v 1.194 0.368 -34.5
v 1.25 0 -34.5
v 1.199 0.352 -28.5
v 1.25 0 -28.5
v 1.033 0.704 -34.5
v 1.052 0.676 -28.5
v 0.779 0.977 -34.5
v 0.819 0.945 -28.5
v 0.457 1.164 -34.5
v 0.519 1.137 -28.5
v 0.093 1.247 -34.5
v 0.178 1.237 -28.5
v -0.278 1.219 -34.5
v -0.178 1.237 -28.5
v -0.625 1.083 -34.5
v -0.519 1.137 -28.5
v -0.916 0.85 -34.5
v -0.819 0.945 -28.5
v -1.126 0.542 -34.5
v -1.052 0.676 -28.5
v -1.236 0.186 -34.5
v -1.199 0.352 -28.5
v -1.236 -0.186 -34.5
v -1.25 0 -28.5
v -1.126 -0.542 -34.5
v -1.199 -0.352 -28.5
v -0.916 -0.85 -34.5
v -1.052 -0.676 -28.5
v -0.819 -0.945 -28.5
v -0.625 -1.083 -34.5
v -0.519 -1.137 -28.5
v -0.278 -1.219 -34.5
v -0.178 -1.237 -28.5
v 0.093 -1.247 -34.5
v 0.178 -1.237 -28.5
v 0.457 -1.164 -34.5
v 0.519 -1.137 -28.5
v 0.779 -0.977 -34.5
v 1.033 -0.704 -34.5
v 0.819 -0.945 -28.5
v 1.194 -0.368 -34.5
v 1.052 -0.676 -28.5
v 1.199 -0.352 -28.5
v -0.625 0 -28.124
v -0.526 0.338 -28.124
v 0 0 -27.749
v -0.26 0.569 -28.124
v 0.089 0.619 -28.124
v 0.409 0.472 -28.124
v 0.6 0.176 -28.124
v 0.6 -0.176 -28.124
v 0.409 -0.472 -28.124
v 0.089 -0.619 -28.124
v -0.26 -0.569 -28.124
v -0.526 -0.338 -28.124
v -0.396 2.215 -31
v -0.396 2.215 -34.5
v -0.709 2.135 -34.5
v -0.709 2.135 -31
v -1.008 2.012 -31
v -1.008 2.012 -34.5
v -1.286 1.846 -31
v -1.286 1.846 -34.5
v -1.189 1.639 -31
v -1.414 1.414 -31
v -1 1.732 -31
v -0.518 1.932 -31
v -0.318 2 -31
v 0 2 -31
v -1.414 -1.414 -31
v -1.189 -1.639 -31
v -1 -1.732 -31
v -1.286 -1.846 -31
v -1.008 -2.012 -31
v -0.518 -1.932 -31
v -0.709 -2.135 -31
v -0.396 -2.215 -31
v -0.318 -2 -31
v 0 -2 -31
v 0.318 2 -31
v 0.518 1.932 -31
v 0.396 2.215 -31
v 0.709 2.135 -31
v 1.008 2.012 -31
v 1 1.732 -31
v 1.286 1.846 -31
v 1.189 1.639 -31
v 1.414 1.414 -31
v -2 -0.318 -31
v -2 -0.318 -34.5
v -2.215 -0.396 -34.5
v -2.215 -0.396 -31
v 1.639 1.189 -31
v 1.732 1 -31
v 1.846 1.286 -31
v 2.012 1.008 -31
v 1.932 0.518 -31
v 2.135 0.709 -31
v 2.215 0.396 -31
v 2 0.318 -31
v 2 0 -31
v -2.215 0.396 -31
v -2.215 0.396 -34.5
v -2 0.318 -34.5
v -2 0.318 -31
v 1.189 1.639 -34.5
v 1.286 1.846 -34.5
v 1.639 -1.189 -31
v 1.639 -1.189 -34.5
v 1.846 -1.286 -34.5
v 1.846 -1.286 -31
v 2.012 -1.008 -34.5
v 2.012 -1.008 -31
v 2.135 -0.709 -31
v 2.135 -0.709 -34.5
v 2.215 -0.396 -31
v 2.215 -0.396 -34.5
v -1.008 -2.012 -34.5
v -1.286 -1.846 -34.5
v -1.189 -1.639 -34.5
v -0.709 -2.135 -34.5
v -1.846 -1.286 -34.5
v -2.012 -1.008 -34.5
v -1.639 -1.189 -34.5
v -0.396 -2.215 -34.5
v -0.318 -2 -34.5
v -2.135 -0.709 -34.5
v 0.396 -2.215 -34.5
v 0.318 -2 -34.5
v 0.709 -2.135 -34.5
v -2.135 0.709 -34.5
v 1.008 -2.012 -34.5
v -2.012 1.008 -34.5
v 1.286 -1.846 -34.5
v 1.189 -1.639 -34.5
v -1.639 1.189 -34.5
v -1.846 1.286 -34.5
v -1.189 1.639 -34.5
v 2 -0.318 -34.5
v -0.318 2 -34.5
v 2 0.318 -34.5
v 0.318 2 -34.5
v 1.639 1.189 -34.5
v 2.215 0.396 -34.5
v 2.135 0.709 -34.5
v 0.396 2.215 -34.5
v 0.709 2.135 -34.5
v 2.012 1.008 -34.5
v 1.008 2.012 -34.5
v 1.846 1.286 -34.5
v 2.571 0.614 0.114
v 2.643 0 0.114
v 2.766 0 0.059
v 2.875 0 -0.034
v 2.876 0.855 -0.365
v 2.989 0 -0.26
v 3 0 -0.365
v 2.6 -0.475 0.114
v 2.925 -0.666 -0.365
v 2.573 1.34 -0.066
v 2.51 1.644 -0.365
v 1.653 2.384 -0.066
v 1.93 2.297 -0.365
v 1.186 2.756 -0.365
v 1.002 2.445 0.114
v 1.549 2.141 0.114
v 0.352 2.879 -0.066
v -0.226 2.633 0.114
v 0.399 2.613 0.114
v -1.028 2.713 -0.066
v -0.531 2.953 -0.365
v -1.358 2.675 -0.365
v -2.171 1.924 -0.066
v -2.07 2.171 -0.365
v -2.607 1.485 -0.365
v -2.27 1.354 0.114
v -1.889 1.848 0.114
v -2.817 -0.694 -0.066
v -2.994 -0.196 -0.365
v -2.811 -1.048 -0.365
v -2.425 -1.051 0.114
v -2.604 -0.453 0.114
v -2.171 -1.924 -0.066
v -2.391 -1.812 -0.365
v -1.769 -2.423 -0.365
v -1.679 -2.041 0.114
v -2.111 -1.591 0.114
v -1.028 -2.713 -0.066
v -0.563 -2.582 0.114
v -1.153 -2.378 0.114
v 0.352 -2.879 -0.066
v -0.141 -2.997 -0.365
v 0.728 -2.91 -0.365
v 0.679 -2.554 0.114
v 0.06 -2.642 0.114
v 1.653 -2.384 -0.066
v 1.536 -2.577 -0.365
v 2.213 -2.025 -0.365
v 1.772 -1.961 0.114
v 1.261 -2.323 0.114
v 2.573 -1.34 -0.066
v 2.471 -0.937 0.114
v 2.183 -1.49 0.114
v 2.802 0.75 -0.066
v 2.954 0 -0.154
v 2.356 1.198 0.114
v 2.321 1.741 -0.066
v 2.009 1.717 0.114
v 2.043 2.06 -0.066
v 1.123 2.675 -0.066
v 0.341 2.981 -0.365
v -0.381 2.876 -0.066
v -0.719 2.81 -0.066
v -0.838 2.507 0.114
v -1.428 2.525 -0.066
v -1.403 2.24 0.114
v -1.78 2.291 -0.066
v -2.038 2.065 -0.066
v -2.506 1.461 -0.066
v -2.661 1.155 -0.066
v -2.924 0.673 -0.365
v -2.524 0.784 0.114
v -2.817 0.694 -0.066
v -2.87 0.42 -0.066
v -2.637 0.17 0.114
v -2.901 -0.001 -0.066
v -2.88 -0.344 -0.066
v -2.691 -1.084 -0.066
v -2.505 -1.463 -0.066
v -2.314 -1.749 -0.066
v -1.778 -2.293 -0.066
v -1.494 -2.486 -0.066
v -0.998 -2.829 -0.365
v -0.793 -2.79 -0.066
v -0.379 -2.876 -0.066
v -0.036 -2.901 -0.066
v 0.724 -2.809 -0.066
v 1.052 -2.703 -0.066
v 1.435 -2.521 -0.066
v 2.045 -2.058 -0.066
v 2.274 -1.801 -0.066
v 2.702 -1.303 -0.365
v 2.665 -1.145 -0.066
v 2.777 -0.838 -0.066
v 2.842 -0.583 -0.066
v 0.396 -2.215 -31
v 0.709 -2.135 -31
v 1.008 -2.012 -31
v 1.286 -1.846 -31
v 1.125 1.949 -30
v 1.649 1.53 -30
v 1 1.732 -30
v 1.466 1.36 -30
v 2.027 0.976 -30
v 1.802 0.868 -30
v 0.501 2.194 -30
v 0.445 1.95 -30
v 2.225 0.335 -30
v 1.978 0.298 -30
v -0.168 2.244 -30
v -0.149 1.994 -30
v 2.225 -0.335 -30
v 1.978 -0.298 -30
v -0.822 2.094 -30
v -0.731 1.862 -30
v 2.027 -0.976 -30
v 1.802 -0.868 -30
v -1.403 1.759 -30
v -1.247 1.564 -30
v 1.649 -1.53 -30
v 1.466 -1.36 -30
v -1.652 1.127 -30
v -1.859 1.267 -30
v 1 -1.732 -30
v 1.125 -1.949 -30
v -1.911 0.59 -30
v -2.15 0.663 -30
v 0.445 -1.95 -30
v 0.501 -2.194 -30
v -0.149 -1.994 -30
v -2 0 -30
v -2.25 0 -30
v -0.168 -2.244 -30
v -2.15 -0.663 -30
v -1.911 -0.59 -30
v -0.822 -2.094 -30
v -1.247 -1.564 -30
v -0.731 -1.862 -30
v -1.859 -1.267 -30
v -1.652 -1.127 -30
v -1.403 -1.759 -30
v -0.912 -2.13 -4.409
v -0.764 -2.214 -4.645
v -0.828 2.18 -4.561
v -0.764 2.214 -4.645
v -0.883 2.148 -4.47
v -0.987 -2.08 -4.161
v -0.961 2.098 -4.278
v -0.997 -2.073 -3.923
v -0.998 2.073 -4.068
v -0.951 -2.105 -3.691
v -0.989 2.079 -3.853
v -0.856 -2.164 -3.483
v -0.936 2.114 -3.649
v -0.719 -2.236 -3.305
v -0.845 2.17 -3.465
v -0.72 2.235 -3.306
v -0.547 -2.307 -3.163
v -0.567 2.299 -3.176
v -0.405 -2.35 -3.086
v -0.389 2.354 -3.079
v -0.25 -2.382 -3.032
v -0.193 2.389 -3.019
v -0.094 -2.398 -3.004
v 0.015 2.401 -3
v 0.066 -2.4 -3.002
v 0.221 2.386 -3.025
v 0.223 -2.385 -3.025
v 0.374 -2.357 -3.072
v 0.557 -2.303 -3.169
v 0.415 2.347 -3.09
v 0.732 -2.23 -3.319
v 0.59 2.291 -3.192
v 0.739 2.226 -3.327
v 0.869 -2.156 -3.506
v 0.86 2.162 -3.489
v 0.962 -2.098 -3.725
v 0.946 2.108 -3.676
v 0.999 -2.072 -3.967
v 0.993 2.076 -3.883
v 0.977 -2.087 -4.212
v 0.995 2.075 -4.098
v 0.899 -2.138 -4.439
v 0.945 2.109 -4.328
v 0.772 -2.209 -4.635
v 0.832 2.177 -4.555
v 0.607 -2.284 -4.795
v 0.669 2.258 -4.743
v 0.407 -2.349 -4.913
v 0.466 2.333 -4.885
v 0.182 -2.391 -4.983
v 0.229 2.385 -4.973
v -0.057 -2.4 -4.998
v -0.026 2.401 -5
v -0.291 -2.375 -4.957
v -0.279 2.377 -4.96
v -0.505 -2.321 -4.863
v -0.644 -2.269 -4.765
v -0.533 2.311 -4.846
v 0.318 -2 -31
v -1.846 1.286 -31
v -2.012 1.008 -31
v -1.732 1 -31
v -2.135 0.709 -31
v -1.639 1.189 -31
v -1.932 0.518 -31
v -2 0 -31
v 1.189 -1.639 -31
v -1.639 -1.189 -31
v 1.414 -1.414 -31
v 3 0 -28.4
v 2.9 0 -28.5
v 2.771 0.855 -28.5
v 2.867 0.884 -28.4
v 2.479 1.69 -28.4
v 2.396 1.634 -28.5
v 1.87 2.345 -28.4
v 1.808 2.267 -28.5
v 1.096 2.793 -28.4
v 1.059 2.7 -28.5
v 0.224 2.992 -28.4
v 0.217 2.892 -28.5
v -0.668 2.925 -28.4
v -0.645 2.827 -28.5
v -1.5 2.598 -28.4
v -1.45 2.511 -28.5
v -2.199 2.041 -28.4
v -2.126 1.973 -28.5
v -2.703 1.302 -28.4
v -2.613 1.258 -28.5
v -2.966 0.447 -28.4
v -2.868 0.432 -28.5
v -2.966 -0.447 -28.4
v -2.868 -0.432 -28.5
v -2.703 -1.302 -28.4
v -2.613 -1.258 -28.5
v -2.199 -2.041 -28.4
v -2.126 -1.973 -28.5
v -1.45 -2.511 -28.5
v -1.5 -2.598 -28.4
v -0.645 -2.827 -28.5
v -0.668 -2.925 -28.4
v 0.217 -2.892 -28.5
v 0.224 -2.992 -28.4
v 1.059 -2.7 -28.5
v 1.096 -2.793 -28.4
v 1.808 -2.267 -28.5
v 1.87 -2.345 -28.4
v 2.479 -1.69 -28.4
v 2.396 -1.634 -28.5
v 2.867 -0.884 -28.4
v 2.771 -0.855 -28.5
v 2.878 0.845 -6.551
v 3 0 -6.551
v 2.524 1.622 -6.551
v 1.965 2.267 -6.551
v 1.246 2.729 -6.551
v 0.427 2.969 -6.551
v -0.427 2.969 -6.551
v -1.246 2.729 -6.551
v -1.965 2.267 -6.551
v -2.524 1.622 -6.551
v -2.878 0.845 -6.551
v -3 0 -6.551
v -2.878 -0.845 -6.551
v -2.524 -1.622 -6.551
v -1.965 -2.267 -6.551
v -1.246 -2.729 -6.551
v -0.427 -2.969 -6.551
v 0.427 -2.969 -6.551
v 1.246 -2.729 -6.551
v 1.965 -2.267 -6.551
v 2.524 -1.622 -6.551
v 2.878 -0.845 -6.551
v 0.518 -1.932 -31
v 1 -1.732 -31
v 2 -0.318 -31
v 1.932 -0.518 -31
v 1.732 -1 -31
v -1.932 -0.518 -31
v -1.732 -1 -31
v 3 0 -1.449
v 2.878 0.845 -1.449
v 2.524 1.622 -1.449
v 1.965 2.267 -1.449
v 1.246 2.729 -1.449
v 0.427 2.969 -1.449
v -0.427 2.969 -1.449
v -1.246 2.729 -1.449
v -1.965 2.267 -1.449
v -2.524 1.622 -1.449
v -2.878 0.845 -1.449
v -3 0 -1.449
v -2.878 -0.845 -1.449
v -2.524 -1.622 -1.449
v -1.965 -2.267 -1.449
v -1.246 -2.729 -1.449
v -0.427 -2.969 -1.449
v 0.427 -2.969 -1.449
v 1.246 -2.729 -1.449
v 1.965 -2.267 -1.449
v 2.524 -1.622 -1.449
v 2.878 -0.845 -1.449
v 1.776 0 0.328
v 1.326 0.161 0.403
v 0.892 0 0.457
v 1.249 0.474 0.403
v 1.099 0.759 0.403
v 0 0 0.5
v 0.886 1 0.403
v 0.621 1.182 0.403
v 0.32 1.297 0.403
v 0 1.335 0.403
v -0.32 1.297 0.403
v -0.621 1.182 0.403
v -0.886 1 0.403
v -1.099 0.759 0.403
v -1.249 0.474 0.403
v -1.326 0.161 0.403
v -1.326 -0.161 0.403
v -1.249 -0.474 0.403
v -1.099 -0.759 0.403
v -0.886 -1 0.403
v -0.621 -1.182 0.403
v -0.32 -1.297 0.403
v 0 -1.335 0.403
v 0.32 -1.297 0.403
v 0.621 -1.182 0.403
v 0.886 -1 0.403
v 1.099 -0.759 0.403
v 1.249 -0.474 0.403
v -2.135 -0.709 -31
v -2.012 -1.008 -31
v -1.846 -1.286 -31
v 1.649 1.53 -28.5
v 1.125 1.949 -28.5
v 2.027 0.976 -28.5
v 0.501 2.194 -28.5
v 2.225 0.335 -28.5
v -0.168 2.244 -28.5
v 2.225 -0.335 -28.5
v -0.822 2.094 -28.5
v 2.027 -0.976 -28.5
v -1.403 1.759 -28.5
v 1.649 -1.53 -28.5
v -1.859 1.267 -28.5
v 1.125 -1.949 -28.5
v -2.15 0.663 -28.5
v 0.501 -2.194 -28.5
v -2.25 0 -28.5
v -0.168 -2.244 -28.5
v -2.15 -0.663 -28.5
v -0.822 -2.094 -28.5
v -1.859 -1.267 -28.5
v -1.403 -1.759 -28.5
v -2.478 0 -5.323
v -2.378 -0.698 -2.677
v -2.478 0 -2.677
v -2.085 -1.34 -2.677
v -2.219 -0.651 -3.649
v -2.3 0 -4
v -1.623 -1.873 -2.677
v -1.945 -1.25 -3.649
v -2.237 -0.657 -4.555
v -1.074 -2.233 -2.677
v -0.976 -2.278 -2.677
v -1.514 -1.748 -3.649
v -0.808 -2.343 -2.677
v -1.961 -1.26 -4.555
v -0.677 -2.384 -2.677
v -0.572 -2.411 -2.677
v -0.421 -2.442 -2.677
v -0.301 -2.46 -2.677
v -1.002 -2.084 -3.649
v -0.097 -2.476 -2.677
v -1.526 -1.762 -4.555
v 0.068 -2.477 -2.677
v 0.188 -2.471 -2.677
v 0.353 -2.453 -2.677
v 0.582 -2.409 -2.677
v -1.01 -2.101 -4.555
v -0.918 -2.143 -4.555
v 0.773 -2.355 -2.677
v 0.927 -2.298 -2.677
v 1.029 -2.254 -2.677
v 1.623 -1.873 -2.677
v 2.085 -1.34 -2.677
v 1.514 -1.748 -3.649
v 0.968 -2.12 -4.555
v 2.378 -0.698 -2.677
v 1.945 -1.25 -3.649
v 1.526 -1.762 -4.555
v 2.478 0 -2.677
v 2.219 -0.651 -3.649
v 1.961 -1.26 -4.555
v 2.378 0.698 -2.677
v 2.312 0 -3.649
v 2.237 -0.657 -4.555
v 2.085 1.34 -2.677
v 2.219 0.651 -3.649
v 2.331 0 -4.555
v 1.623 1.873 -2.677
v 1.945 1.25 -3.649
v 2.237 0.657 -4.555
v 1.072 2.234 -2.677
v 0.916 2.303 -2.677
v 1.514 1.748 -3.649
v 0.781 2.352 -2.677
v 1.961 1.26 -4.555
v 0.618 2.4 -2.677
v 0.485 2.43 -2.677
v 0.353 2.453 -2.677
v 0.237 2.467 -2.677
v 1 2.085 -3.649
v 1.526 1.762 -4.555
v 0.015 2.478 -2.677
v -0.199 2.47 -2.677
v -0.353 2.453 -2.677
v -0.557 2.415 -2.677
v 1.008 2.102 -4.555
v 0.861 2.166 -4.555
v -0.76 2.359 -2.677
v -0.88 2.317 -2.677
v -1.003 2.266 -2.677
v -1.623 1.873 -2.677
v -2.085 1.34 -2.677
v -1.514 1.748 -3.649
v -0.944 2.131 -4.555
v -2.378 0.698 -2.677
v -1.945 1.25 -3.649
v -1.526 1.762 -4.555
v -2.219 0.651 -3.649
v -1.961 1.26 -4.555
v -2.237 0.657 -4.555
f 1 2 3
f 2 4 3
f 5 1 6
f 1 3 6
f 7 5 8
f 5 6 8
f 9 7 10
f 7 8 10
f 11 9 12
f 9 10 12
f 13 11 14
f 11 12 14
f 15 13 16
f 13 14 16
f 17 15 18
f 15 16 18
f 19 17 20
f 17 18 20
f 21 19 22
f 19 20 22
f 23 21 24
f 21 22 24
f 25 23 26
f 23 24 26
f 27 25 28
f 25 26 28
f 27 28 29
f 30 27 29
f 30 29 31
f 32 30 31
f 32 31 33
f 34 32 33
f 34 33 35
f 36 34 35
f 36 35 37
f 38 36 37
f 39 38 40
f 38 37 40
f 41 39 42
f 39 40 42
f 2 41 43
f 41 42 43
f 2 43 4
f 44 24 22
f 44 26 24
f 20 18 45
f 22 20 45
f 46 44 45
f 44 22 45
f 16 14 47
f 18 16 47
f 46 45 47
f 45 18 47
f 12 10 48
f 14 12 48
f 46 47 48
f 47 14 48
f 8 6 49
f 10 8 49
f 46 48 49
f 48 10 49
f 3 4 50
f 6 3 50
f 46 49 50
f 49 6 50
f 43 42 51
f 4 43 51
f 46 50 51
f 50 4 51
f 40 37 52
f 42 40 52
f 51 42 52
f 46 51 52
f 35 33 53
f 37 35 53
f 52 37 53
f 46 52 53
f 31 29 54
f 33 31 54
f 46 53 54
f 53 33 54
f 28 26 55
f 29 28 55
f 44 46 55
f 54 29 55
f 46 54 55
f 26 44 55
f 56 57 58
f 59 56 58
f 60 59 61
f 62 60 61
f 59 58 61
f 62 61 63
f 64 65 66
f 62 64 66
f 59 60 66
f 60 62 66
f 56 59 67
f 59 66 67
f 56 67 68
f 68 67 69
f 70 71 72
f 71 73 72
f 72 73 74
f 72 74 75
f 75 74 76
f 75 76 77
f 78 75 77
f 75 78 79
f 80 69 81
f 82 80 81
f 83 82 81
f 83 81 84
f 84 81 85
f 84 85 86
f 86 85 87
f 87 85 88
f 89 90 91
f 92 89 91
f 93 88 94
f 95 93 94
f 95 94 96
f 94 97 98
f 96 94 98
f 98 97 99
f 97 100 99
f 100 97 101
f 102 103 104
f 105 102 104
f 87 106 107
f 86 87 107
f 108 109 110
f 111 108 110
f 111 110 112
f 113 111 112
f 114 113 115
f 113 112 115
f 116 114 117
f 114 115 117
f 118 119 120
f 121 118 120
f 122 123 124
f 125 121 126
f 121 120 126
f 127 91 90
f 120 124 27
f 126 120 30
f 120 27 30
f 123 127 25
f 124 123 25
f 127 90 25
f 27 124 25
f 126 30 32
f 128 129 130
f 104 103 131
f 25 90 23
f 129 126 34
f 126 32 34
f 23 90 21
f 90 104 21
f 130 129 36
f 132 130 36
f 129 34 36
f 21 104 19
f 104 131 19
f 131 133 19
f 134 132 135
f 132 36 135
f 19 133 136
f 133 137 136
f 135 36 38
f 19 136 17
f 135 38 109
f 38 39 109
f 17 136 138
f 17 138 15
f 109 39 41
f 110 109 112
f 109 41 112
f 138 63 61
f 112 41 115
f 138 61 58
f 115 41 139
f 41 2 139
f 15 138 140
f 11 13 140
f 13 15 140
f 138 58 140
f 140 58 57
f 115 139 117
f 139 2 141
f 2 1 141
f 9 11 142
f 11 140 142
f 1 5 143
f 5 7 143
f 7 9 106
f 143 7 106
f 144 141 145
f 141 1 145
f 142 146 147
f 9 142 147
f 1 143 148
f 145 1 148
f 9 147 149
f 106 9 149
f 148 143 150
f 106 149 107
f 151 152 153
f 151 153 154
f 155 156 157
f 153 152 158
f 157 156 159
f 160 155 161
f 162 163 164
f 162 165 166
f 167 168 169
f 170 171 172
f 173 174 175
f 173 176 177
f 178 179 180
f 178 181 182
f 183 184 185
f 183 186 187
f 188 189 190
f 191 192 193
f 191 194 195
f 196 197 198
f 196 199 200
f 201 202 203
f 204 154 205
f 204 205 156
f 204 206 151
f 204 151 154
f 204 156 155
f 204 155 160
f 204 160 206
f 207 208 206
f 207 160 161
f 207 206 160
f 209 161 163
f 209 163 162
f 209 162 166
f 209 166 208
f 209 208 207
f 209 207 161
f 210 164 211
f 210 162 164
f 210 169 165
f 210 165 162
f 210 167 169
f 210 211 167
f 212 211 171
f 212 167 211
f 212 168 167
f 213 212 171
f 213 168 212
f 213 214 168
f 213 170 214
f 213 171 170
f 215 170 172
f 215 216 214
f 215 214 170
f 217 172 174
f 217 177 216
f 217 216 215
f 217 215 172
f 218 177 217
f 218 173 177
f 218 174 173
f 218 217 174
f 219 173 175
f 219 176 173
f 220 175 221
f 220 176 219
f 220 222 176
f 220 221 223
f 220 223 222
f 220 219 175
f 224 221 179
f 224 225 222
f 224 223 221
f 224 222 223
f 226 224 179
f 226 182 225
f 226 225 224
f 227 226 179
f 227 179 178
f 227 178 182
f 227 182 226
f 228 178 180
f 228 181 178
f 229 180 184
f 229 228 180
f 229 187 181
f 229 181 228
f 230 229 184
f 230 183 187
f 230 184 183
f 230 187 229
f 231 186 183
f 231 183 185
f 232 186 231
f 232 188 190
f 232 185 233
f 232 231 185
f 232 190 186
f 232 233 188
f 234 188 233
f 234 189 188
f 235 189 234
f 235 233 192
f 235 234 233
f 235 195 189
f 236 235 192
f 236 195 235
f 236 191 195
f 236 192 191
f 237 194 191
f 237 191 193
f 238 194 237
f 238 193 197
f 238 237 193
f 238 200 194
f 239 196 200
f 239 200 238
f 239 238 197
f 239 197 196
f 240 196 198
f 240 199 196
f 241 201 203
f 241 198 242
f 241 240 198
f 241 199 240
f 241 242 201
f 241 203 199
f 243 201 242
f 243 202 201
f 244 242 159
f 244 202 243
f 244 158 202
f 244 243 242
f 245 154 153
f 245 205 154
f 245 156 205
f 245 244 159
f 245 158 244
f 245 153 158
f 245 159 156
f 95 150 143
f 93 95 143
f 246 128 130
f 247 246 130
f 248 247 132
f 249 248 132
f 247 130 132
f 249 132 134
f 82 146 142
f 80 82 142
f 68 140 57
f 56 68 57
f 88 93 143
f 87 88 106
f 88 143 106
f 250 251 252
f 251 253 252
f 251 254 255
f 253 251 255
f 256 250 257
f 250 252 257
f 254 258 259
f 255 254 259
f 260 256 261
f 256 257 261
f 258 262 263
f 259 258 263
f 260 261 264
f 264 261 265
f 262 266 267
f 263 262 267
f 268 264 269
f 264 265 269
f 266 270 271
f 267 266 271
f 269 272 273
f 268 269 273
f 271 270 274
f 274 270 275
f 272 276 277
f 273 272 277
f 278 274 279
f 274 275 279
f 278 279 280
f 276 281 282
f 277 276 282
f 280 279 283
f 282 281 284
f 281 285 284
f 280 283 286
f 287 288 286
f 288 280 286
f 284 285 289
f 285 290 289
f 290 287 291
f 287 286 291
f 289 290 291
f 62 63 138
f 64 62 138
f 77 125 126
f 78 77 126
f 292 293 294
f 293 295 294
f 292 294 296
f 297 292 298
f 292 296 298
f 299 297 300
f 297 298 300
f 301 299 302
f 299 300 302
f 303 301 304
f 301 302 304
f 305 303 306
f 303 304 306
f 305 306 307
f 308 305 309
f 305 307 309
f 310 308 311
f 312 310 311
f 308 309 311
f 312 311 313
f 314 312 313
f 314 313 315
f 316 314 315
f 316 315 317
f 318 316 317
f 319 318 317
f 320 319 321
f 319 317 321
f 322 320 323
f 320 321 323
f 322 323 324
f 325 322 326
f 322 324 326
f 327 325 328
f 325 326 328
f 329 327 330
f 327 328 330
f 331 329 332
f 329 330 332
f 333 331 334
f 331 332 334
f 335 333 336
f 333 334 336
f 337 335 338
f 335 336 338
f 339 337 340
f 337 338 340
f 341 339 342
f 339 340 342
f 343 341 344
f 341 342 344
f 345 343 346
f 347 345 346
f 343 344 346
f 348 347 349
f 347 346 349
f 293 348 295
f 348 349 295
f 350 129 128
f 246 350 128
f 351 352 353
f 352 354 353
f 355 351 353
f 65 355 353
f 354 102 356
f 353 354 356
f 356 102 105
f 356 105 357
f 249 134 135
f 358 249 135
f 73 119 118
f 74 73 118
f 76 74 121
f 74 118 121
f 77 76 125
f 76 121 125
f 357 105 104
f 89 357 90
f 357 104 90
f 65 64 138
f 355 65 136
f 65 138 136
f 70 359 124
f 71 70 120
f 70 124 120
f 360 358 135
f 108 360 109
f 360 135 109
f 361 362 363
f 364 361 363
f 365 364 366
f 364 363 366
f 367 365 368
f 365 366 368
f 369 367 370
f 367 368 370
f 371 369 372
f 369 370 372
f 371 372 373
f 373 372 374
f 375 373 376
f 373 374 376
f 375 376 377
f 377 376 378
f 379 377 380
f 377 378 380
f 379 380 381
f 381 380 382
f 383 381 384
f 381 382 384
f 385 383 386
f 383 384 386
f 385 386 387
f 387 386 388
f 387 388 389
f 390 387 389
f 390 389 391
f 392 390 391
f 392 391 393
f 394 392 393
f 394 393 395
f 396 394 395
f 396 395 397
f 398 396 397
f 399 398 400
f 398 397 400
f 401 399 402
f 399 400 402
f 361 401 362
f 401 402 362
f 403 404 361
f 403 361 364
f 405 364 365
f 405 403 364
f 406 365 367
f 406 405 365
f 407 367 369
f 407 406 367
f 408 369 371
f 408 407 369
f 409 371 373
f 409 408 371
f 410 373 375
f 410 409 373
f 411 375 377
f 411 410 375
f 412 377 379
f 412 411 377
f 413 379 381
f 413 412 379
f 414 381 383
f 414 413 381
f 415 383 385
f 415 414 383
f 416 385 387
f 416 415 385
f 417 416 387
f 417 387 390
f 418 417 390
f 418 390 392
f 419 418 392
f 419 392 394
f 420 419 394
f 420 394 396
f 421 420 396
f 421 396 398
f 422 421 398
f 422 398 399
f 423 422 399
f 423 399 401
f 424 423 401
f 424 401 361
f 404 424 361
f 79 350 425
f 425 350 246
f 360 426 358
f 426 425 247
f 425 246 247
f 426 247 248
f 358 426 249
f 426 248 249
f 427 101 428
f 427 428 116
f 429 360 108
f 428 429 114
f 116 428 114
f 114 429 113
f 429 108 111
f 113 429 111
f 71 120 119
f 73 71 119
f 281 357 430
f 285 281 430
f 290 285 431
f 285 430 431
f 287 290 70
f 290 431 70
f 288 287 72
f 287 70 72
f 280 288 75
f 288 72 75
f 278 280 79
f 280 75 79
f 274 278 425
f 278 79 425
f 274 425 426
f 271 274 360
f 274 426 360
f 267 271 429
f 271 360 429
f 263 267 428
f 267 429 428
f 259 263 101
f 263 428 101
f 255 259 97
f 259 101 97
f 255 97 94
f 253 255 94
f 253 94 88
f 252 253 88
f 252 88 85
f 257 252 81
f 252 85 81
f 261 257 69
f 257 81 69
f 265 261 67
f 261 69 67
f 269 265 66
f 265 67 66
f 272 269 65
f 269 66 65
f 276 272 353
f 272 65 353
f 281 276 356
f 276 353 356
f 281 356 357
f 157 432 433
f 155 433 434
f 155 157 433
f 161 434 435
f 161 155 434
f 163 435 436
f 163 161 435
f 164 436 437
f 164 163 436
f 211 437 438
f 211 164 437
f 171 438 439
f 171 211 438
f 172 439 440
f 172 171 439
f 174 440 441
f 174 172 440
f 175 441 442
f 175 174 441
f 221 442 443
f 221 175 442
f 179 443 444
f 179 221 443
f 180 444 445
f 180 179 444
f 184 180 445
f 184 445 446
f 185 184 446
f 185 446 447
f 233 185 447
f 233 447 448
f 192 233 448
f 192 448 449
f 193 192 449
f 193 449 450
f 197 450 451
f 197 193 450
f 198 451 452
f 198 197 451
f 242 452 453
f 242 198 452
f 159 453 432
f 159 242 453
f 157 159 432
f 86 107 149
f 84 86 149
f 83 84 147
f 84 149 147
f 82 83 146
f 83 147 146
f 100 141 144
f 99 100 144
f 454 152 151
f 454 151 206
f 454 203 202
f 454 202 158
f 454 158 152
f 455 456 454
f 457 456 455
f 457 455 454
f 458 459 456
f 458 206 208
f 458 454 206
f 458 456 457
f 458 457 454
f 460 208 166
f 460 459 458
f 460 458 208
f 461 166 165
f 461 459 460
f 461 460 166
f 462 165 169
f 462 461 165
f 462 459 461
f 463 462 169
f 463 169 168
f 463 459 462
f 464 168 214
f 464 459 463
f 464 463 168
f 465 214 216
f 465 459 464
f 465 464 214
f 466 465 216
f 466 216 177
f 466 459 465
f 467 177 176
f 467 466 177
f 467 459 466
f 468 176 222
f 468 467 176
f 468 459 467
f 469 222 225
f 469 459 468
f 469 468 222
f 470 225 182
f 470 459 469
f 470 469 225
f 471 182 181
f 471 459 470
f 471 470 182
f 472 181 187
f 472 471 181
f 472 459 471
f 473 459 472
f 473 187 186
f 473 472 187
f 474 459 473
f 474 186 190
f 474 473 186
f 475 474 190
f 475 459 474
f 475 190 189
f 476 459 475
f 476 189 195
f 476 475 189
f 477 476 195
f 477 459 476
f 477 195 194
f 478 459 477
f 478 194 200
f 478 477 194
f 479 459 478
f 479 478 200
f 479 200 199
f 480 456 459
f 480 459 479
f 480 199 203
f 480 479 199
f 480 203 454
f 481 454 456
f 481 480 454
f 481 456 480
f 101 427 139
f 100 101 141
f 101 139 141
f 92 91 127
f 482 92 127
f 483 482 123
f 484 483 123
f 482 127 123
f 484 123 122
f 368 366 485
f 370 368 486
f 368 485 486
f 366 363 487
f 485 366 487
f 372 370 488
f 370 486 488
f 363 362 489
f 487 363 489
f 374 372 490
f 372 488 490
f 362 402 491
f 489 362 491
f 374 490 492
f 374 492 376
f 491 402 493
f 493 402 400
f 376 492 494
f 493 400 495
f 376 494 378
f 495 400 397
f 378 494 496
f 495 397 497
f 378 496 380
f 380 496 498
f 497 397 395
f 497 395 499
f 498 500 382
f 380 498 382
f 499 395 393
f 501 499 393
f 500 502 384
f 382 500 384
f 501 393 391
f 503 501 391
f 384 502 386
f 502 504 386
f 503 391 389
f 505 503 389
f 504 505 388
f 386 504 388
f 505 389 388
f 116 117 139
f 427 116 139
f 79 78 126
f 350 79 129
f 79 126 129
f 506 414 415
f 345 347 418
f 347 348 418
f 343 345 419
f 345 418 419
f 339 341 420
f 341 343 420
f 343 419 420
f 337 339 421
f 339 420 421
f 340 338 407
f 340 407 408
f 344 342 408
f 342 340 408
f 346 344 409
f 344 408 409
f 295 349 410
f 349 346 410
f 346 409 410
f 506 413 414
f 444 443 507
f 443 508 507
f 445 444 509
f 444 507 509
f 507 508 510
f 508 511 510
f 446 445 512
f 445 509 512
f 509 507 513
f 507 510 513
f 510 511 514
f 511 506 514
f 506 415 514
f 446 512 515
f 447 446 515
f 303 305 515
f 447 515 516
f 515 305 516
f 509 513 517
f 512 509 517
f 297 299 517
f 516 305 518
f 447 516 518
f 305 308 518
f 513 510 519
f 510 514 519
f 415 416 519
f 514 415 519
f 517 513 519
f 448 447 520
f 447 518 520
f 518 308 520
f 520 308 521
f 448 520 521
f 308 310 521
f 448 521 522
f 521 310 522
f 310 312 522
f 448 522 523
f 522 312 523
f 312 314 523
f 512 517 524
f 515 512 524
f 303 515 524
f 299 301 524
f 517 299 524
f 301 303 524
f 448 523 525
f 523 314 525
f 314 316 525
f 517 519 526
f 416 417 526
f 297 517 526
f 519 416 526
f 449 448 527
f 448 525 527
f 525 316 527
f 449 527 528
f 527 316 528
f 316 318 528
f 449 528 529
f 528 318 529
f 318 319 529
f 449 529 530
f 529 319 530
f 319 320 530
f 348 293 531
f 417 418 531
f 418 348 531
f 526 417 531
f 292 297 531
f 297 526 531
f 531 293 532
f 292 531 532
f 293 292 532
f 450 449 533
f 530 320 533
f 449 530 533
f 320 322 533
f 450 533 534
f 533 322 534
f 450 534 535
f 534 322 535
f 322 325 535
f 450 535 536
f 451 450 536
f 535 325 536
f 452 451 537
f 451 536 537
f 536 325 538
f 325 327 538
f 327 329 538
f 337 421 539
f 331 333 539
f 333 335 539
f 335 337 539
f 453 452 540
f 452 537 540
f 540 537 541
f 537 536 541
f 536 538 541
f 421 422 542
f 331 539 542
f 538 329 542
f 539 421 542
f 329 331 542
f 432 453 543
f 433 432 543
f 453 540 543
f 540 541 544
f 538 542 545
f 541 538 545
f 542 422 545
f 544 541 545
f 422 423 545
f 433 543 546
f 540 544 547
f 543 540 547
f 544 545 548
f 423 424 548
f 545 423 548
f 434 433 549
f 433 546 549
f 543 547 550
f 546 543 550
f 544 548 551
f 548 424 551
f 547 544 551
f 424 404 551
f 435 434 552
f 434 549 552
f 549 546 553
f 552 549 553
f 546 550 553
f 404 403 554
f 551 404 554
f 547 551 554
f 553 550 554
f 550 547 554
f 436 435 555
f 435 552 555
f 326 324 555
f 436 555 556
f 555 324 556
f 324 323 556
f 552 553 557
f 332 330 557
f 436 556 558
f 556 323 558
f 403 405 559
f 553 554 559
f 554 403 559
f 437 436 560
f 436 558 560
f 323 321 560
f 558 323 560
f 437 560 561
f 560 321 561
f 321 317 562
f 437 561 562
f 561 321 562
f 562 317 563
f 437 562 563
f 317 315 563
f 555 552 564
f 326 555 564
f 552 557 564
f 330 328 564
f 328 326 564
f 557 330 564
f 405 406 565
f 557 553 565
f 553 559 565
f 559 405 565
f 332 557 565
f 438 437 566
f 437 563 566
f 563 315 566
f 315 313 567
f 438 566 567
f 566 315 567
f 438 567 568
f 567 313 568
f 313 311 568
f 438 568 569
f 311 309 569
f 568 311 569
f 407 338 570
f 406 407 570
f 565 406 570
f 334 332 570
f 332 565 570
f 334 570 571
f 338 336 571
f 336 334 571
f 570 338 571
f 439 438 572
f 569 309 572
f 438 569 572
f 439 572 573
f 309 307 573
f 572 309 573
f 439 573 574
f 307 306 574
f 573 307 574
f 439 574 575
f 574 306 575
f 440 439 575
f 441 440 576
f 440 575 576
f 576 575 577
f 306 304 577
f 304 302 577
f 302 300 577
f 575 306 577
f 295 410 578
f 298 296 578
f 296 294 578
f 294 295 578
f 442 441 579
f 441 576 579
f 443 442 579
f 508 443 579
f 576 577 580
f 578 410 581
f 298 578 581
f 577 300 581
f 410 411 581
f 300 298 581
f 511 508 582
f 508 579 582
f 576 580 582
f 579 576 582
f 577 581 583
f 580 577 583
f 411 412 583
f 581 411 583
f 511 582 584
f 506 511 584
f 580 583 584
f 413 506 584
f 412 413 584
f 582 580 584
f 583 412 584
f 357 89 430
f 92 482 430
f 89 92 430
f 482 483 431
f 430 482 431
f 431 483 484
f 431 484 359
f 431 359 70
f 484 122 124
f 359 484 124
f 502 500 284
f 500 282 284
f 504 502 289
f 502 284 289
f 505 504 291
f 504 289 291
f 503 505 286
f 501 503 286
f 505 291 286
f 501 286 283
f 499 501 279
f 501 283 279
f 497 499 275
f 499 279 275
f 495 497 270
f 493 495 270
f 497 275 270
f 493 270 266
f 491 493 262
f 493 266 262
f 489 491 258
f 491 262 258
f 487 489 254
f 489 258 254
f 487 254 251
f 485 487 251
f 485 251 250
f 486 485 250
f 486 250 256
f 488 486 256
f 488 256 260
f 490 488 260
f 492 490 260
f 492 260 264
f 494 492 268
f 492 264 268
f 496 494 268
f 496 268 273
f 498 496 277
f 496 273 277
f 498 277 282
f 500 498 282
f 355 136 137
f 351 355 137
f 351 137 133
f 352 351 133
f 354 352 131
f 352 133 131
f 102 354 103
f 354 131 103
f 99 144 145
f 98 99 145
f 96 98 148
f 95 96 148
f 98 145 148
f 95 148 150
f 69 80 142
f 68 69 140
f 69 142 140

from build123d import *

# Parameters (mm, degrees)
SKETCH1_R                 = 3
BOSS_EXTRUDE1_DEPTH       = 34.5
SKETCH2_R                 = 5
SKETCH3_R                 = 1
CUT_EXTRUDE1_DEPTH        = 3
DOME1_FACE_RADIUS         = 3
DOME1_HEIGHT              = 0.5
CUT_EXTRUDE2_DEPTH        = 3.5
CIRPATTERN1_COUNT         = 8
FILLET1_R                 = 0.5
CHAMFER1_SIZE             = 0.1
M3X0_5_TAPPED_HOLE1_D     = 2.5
M3X0_5_TAPPED_HOLE1_DEPTH = 6
M3X0_5_TAPPED_HOLE1_TIP   = 0.751075774


with BuildPart() as part:
    # Sketch1 → Boss-Extrude1 (new body)
    with BuildSketch(Plane.XY):
        Circle(SKETCH1_R)
    extrude(amount=-BOSS_EXTRUDE1_DEPTH)

    # Sketch2 → Cut-Revolve1 (revolve, cut)
    with BuildSketch(Plane(origin=(0, 0, 0), x_dir=(0, 0, -1), z_dir=(1, 0, 0)), mode=Mode.PRIVATE) as cut_revolve1_sk:
        with Locations((4, 7.3)):
            Circle(SKETCH2_R)
        Polygon((30, 2.25), (30, 2), (31, 2), (31, 2.25), (34.5, 2.25), (34.5, 3), (28.5, 3), (28.5, 2.25), align=None)
    revolve(cut_revolve1_sk.sketch.rotate(Axis((0, 0, -34.5), (0, 0, 1)), 90), axis=Axis((0, 0, -34.5), (0, 0, 1)), mode=Mode.SUBTRACT)

    # Sketch3 → Cut-Extrude1 (cut, symmetric)
    with BuildSketch(Plane(origin=(0, 0, 0), x_dir=(1, 0, 0), z_dir=(0, 1, 0))):
        with Locations(Location((0, 4, 0), (0, 0, 139.808309089))):
            Circle(SKETCH3_R)
    extrude(amount=CUT_EXTRUDE1_DEPTH, both=True, mode=Mode.SUBTRACT)

    # Dome1: a dome of height H over a round flat face of radius A is a cap of a sphere of radius (A * A + H * H) / (2 * H)
    dome1_r = (DOME1_FACE_RADIUS * DOME1_FACE_RADIUS + DOME1_HEIGHT * DOME1_HEIGHT) / (2 * DOME1_HEIGHT)
    dome1_base = Plane((0, 0, 0), z_dir=(0, 0, 1))
    with Locations(dome1_base.offset(DOME1_HEIGHT - dome1_r)):
        dome1_ball = Sphere(dome1_r, mode=Mode.PRIVATE)
    add(split(dome1_ball, bisect_by=dome1_base, keep=Keep.TOP, mode=Mode.PRIVATE))

    # Sketch4 → Cut-Extrude2 (cut)
    with BuildSketch(Plane(origin=(0, 0, -34.5), x_dir=(-1, 0, 0), z_dir=(0, 0, -1))):
        Polygon((-0.5, 2.5), (-0.318014883, 2), (0.318014883, 2), (0.5, 2.5), align=None)
    cut_extrude2 = extrude(amount=-CUT_EXTRUDE2_DEPTH, mode=Mode.SUBTRACT)

    # CirPattern1: Cut-Extrude2 ×8 about axis
    cirpattern1_axis = Axis((0, 0, 0), (0, 0, 1))
    for i in range(1, CIRPATTERN1_COUNT):
        add(cut_extrude2.rotate(cirpattern1_axis, i * 360 / CIRPATTERN1_COUNT), mode=Mode.SUBTRACT)

    # Fillet1
    fillet1_edges = [part.edges().sort_by_distance(p)[0] for p in [
        (-3, 0, 0),
    ]]
    fillet(fillet1_edges, radius=FILLET1_R)

    # Chamfer1
    chamfer1_edges = [part.edges().sort_by_distance(p)[0] for p in [
        (-3, 0, -28.5),
    ]]
    chamfer(chamfer1_edges, length=CHAMFER1_SIZE)

    # M3x0.5 Tapped Hole1
    with Locations(Plane(origin=(0, 0, -34.5), x_dir=(-1, 0, 0), z_dir=(0, 0, -1))):
        with Locations((0, 0)):
            Hole(M3X0_5_TAPPED_HOLE1_D / 2, depth=M3X0_5_TAPPED_HOLE1_DEPTH)
            with Locations((0, 0, -(M3X0_5_TAPPED_HOLE1_DEPTH + M3X0_5_TAPPED_HOLE1_TIP / 2))):  # 118° drill point
                Cone(0, M3X0_5_TAPPED_HOLE1_D / 2, M3X0_5_TAPPED_HOLE1_TIP, mode=Mode.SUBTRACT)


solid = part.part
